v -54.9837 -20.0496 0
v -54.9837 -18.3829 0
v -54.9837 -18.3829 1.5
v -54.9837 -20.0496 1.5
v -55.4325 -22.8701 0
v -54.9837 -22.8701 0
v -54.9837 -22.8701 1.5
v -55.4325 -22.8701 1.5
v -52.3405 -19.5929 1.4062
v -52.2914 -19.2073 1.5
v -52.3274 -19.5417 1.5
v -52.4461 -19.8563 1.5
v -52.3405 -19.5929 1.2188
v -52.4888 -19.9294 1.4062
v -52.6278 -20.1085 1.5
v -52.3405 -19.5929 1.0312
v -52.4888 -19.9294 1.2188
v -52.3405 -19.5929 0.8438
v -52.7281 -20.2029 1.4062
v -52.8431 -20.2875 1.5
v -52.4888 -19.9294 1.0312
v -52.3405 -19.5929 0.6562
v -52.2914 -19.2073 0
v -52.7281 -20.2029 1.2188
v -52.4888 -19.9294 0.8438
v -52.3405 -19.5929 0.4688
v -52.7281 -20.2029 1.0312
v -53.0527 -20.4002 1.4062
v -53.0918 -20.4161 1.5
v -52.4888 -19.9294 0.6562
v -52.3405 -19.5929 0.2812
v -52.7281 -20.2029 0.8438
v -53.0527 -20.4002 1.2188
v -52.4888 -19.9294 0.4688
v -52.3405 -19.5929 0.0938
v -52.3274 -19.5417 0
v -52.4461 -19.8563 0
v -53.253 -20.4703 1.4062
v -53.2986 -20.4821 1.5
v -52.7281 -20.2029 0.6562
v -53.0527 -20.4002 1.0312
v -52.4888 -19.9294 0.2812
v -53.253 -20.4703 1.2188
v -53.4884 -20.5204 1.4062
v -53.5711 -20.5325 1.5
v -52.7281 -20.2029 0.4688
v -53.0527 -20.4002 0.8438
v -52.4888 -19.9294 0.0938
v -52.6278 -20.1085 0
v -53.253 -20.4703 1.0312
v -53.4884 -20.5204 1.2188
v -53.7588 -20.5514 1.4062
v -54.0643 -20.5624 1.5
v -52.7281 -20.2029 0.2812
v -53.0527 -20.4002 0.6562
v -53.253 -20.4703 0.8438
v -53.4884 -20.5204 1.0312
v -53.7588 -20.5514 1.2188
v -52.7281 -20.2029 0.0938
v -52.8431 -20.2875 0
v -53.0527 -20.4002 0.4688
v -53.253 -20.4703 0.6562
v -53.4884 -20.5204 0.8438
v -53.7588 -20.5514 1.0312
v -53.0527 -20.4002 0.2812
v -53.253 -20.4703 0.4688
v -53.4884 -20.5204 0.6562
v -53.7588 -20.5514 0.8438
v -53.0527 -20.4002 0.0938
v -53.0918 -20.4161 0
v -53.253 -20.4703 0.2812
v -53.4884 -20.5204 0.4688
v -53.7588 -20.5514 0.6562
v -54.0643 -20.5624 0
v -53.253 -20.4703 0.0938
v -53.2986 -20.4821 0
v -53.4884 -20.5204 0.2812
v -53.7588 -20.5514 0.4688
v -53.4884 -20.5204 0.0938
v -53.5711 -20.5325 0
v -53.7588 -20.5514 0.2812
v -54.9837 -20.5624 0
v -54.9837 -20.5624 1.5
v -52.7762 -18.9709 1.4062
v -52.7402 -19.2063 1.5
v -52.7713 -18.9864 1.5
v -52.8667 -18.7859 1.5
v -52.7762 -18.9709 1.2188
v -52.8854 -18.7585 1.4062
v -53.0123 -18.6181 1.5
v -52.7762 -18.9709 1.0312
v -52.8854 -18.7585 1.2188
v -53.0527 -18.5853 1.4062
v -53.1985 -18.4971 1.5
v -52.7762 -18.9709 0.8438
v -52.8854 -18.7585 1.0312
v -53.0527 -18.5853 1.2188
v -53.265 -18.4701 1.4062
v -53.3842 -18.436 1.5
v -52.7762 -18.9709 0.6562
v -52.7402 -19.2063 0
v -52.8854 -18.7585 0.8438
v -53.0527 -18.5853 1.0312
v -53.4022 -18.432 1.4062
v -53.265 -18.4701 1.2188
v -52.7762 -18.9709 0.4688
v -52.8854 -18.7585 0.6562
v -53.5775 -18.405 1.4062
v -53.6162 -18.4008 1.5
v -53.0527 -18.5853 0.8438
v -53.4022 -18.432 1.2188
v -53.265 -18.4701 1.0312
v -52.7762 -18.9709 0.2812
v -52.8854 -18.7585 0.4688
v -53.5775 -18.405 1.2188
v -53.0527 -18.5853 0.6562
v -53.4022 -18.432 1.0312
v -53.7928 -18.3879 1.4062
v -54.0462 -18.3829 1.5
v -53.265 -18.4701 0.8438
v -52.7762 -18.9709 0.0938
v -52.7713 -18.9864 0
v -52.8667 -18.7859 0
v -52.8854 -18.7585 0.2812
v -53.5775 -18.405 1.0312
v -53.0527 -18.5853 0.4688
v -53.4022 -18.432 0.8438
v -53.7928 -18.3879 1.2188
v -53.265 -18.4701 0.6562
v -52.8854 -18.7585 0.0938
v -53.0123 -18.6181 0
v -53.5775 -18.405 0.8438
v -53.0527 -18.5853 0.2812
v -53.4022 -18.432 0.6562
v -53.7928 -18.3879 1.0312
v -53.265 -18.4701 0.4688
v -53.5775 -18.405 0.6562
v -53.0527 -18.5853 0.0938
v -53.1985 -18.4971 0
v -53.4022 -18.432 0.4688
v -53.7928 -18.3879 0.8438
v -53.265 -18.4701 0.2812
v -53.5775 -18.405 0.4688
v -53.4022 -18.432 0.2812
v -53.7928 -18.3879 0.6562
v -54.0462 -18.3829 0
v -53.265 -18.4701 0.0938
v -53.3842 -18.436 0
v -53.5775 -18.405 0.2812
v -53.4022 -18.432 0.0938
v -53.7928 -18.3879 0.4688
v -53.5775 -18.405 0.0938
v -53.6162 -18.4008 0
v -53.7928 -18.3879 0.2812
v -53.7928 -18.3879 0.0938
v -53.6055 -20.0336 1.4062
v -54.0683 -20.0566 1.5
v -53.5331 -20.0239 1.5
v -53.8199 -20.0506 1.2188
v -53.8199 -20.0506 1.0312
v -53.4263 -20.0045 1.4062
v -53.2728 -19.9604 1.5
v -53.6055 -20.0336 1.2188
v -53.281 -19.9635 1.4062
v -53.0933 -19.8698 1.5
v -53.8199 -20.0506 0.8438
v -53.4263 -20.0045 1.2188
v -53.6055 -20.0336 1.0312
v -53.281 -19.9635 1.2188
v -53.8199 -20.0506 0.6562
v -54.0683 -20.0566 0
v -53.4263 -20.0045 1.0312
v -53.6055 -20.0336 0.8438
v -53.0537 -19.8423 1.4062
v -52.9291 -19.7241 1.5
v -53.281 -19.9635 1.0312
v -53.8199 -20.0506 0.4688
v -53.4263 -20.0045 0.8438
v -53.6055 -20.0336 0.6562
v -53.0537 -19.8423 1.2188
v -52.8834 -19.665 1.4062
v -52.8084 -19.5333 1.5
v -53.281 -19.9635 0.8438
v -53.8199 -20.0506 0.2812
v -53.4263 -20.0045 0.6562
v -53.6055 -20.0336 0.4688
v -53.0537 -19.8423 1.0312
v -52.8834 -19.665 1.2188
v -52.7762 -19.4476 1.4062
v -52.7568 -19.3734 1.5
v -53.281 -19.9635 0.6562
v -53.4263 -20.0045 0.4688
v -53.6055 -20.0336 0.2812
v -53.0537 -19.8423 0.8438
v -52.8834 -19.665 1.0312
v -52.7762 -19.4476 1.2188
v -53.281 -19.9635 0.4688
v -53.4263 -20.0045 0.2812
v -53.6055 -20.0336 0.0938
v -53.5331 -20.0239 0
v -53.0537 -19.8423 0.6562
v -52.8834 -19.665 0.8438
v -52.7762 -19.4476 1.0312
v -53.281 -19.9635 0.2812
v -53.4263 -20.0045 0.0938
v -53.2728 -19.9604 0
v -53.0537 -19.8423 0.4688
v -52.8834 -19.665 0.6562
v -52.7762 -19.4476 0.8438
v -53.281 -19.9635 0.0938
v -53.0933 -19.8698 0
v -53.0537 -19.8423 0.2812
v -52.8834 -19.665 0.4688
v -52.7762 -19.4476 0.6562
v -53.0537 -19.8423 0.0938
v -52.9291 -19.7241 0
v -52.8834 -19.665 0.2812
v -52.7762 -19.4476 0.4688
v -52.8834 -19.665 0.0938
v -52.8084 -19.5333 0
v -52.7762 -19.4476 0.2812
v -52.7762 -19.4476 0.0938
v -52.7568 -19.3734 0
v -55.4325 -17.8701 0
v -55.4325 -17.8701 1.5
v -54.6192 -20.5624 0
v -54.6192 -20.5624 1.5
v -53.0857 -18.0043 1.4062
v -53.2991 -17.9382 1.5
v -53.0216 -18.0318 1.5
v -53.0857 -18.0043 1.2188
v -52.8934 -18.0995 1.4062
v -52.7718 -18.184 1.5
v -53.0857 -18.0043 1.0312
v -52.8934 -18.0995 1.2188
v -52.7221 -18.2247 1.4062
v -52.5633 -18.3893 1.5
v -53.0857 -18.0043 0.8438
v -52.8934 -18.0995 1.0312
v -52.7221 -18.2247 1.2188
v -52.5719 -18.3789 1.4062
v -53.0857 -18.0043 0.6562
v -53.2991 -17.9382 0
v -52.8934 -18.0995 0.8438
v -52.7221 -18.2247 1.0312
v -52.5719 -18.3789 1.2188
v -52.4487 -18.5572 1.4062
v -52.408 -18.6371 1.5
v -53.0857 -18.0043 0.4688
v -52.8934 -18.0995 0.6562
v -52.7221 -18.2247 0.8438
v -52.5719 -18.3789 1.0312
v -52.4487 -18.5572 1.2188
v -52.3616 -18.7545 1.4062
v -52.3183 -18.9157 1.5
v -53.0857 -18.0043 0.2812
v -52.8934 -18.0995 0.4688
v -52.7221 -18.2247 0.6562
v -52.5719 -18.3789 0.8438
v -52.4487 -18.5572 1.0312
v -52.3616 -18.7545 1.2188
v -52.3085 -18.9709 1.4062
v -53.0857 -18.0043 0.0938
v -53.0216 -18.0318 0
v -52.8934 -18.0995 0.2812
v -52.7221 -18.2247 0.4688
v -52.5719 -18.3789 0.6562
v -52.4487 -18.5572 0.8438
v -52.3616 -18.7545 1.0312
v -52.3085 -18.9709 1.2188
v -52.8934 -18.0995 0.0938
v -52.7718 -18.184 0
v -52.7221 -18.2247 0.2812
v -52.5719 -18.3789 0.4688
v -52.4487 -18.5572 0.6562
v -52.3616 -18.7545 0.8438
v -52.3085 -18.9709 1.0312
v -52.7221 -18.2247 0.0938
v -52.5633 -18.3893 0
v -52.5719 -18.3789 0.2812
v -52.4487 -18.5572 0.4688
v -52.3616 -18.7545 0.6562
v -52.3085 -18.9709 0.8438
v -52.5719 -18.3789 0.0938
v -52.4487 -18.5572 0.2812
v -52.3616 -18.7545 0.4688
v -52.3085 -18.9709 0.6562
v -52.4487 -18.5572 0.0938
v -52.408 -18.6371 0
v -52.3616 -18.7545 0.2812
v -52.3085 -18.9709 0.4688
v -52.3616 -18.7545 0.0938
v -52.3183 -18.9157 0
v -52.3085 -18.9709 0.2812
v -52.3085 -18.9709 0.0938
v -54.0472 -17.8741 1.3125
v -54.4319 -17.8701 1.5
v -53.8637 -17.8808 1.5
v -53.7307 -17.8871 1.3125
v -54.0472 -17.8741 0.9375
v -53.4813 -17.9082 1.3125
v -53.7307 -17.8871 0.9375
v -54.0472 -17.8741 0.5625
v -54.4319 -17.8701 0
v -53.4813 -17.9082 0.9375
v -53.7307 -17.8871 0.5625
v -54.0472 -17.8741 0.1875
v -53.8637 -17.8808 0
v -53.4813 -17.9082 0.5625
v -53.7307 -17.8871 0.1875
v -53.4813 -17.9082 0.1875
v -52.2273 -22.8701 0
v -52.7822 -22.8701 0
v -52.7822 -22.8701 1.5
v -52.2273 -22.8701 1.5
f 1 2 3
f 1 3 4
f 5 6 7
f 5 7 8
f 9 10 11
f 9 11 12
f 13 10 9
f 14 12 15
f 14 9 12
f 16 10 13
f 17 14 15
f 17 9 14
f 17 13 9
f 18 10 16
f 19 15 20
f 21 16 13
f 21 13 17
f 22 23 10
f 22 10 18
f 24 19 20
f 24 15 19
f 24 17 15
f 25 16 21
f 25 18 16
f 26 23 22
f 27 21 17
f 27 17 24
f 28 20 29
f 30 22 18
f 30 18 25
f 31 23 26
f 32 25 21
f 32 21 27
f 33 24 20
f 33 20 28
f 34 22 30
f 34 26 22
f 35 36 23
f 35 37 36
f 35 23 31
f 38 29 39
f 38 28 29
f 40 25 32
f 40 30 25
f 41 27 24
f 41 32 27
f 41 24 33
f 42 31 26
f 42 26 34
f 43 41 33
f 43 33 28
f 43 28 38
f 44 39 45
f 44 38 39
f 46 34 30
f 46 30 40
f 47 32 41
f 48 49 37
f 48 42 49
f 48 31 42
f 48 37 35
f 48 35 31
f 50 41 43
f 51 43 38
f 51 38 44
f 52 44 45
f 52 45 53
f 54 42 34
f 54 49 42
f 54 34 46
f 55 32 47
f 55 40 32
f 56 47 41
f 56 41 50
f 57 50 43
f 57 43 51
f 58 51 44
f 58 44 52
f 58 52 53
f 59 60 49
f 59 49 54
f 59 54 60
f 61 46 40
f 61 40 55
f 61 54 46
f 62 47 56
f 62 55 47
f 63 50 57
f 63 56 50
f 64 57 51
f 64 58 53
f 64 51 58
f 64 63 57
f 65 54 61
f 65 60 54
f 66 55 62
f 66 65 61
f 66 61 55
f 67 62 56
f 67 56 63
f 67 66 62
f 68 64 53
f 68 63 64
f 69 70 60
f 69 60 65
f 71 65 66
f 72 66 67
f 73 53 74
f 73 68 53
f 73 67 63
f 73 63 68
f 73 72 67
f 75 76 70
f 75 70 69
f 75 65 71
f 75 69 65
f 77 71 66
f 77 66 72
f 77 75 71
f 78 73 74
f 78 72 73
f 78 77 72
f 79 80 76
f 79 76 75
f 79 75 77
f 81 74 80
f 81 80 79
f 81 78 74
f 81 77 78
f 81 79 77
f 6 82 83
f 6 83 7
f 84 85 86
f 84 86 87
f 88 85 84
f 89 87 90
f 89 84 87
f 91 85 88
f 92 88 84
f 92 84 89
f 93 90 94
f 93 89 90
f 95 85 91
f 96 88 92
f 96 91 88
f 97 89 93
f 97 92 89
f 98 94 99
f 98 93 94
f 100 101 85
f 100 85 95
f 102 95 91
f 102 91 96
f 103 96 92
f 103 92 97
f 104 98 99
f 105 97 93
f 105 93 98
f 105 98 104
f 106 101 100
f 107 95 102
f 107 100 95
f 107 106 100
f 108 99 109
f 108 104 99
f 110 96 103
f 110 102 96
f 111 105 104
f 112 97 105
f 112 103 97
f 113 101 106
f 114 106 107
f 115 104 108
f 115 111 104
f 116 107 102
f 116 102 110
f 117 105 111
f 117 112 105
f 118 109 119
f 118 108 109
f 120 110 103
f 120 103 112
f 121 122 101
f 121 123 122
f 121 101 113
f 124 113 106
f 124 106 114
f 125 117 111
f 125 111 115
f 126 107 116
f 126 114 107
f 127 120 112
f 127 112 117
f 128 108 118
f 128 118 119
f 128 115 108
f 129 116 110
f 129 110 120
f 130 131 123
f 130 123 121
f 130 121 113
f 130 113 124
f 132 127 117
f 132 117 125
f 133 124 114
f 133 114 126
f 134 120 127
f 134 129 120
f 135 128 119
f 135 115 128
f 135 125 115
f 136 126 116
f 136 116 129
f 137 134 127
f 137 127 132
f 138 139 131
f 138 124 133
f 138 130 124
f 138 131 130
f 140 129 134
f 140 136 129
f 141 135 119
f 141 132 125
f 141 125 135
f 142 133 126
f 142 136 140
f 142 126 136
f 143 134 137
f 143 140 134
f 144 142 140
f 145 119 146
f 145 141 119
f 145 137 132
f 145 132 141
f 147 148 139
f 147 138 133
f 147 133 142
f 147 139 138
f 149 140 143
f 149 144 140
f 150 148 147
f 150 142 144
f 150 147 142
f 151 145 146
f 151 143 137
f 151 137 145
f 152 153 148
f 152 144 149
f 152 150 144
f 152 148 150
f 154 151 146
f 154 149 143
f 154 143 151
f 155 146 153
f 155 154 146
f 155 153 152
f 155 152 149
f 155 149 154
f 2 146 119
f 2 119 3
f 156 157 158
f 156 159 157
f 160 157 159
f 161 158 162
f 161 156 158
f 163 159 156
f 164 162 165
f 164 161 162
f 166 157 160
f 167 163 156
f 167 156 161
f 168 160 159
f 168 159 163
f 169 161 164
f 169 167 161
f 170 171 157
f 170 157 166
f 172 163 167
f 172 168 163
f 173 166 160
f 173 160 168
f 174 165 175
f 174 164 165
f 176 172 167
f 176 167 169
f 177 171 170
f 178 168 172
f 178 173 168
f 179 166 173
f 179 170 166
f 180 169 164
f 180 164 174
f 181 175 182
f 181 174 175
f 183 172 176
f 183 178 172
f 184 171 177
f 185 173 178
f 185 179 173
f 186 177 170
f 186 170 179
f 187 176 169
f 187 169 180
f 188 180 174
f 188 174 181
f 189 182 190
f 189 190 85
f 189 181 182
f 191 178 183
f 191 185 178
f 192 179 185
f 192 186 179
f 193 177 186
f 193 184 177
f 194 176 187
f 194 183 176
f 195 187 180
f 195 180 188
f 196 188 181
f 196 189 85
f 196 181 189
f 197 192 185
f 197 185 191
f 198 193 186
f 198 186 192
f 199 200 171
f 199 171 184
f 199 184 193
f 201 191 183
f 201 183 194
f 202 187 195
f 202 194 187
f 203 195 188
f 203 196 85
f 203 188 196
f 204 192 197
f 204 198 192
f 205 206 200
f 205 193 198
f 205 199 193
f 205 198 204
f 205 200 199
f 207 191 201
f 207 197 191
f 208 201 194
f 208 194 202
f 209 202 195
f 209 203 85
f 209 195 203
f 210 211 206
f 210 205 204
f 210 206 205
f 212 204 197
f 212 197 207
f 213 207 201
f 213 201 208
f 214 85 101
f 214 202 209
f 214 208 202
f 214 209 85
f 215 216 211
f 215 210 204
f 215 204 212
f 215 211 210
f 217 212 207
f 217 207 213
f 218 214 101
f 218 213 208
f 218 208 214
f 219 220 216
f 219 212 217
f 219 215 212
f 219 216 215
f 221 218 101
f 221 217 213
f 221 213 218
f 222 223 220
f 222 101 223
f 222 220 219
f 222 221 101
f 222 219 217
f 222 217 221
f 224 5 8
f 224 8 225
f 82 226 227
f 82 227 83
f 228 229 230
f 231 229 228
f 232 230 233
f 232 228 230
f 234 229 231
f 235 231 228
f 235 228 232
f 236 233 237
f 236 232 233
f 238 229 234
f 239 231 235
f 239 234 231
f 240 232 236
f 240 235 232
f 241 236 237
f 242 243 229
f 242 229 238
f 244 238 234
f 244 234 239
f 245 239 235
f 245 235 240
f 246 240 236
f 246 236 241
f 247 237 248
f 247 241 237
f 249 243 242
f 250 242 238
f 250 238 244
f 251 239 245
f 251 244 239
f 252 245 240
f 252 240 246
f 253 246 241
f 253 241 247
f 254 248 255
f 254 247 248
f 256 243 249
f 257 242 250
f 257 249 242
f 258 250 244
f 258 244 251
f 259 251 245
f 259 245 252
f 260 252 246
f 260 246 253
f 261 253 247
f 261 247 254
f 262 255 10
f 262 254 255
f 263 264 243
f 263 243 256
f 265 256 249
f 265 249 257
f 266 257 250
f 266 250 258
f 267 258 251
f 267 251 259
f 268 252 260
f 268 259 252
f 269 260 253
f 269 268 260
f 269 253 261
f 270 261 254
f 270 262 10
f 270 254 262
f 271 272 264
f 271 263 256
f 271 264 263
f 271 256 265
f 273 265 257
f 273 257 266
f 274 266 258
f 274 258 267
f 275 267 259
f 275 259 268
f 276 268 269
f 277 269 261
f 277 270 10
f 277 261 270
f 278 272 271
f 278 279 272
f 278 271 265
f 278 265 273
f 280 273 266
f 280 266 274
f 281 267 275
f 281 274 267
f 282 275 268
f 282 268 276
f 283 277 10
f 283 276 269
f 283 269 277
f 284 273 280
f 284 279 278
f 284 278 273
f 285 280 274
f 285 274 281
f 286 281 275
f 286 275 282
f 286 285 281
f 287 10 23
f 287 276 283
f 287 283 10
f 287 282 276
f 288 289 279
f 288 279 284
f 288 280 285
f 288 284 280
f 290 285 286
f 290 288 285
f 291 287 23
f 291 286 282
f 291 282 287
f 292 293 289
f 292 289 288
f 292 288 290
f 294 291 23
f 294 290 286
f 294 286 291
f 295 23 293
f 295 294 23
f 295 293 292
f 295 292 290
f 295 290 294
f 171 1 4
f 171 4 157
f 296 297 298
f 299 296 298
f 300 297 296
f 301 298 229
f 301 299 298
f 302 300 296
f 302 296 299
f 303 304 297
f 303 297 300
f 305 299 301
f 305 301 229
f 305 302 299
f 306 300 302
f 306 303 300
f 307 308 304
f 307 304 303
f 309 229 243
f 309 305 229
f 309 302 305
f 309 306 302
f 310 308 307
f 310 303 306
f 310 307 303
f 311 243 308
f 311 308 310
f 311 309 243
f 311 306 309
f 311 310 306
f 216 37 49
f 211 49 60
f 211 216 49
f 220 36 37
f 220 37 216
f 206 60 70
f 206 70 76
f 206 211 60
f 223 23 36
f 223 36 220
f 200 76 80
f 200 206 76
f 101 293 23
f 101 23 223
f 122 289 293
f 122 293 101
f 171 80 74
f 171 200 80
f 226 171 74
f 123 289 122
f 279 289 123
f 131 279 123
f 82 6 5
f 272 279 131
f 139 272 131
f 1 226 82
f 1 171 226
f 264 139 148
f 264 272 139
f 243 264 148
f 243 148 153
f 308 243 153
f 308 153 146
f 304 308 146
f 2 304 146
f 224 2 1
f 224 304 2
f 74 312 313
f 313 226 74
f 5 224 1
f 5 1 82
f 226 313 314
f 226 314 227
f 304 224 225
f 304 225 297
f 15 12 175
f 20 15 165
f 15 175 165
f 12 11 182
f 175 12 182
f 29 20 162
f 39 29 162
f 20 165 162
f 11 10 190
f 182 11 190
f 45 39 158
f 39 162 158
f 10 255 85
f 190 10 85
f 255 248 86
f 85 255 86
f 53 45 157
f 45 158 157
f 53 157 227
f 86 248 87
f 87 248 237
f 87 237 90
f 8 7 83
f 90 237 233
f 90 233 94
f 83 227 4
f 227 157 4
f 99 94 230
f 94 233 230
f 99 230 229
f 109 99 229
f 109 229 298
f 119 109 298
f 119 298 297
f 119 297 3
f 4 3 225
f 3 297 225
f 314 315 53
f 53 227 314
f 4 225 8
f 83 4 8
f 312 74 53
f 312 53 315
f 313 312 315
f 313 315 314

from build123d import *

# Parameters (mm, degrees)
BOSS_EXTRU_1_DEPTH = 1.5


with BuildPart() as part:
    # Esquisse1 → Boss.-Extru.1 (new body)
    with BuildSketch(Plane.XY):
        with BuildLine():
            Line((-55.432465326, -17.870119076), (-54.431864364, -17.870119076))
            add(Edge.make_bspline(
                [(-54.431864364, -17.870119076), (-54.365091324, -17.870341342), (-54.236879689, -17.870768117), (-54.053203588, -17.873147778), (-53.886307735, -17.879968286), (-53.736279393, -17.885837691), (-53.603121315, -17.896540464), (-53.486425185, -17.90676996), (-53.386728475, -17.920160904), (-53.326377258, -17.932597223), (-53.299051864, -17.938228051)],
                knots=[0, 0, 0, 0, 1.410062039, 2.707475311, 3.878576406, 4.937260626, 5.877586885, 6.699081471, 7.410979367, 8, 8, 8, 8], degree=3))
            add(Edge.make_bspline(
                [(-53.299051864, -17.938228051), (-53.262470973, -17.947266287), (-53.190089559, -17.965149949), (-53.085875179, -18.002949379), (-52.986569002, -18.0466917), (-52.892583539, -18.098068443), (-52.804389551, -18.157460986), (-52.721077679, -18.223844018), (-52.642269874, -18.296854312), (-52.571153259, -18.378332657), (-52.504097471, -18.463813385), (-52.447542291, -18.556247323), (-52.398790177, -18.652906648), (-52.359975152, -18.754774388), (-52.328720905, -18.860862633), (-52.30668342, -18.972132343), (-52.293467437, -19.088076593), (-52.292121929, -19.16715932), (-52.291439685, -19.207258499)],
                knots=[0, 0, 0, 0, 1.027469482, 2.033020251, 3.019912614, 3.986113645, 4.951240523, 5.91722682, 6.890402269, 7.87763091, 8.8651537, 9.85103654, 10.82876324, 11.815024772, 12.821070561, 13.842952187, 14.906261191, 16, 16, 16, 16], degree=3))
            add(Edge.make_bspline(
                [(-52.291439685, -19.207258499), (-52.293538254, -19.273880077), (-52.297633105, -19.403876031), (-52.335811824, -19.592534433), (-52.39834971, -19.768519169), (-52.484525837, -19.931608651), (-52.594267945, -20.078623859), (-52.726160504, -20.207753081), (-52.880277091, -20.315810099), (-53.023747543, -20.390742677), (-53.150482114, -20.438732547), (-53.254815418, -20.472498773), (-53.368625386, -20.498587295), (-53.490821578, -20.521958912), (-53.621912514, -20.53960419), (-53.761583999, -20.552527896), (-53.909935644, -20.560605109), (-54.011848601, -20.561807973), (-54.064276223, -20.562426769)],
                knots=[0, 0, 0, 0, 1.260483769, 2.459530307, 3.627416485, 4.787058657, 5.939039949, 7.08810263, 8.267026773, 9.491475466, 10.141966685, 10.831826277, 11.566392101, 12.351337768, 13.187381173, 14.07005841, 15.007169909, 16, 16, 16, 16], degree=3))
            Line((-54.064276223, -20.562426769), (-52.227337121, -22.870119076))
            Line((-52.227337121, -22.870119076), (-52.782224941, -22.870119076))
            Line((-52.782224941, -22.870119076), (-54.619164044, -20.562426769))
            Line((-54.619164044, -20.562426769), (-54.983747377, -20.562426769))
            Line((-54.983747377, -20.562426769), (-54.983747377, -22.870119076))
            Line((-54.983747377, -22.870119076), (-55.432465326, -22.870119076))
            Line((-55.432465326, -22.870119076), (-55.432465326, -17.870119076))
        make_face()
        with BuildLine():
            Line((-54.983747377, -18.382939589), (-54.983747377, -20.049606256))
            Line((-54.983747377, -20.049606256), (-54.068282634, -20.056617474))
            add(Edge.make_bspline(
                [(-54.068282634, -20.056617474), (-54.025539721, -20.056636383), (-53.942691782, -20.056673035), (-53.822833689, -20.050967641), (-53.71123353, -20.044477186), (-53.60831817, -20.034549549), (-53.514041634, -20.021755161), (-53.428451043, -20.005750898), (-53.351406683, -19.987105094), (-53.261551628, -19.958245629), (-53.161213727, -19.912522746), (-53.052168784, -19.846000605), (-52.959308301, -19.762330434), (-52.880854212, -19.666654069), (-52.817812167, -19.561459427), (-52.773366375, -19.448007471), (-52.745162886, -19.329162331), (-52.741836393, -19.24747932), (-52.740157634, -19.206256897)],
                knots=[0, 0, 0, 0, 1.146690395, 2.22261258, 3.21895312, 4.145990853, 4.996080663, 5.770904154, 6.481378293, 7.121626537, 8.300444488, 9.431385265, 10.535395872, 11.636531494, 12.74115979, 13.810798291, 14.895190096, 16, 16, 16, 16], degree=3))
            add(Edge.make_bspline(
                [(-52.740157634, -19.206256897), (-52.741874949, -19.166047506), (-52.745278043, -19.086367165), (-52.773061998, -18.969715864), (-52.820046828, -18.859620221), (-52.883364311, -18.7565281), (-52.960505961, -18.662948477), (-53.050959979, -18.582881116), (-53.152253115, -18.516810452), (-53.246926256, -18.474589908), (-53.331546559, -18.448704404), (-53.405017502, -18.430488455), (-53.488033899, -18.4158535), (-53.58099884, -18.404127698), (-53.683515455, -18.394049207), (-53.796102099, -18.387260951), (-53.918011786, -18.383241146), (-54.002507402, -18.383042447), (-54.046247377, -18.382939589)],
                knots=[0, 0, 0, 0, 1.101028733, 2.181837193, 3.264309656, 4.369019818, 5.486613113, 6.575447106, 7.666700264, 8.788928104, 9.402425223, 10.0903467, 10.862060571, 11.710948788, 12.657782767, 13.684531032, 14.801375019, 16, 16, 16, 16], degree=3))
            Line((-54.046247377, -18.382939589), (-54.983747377, -18.382939589))
        make_face(mode=Mode.SUBTRACT)
    extrude(amount=BOSS_EXTRU_1_DEPTH)


solid = part.part
